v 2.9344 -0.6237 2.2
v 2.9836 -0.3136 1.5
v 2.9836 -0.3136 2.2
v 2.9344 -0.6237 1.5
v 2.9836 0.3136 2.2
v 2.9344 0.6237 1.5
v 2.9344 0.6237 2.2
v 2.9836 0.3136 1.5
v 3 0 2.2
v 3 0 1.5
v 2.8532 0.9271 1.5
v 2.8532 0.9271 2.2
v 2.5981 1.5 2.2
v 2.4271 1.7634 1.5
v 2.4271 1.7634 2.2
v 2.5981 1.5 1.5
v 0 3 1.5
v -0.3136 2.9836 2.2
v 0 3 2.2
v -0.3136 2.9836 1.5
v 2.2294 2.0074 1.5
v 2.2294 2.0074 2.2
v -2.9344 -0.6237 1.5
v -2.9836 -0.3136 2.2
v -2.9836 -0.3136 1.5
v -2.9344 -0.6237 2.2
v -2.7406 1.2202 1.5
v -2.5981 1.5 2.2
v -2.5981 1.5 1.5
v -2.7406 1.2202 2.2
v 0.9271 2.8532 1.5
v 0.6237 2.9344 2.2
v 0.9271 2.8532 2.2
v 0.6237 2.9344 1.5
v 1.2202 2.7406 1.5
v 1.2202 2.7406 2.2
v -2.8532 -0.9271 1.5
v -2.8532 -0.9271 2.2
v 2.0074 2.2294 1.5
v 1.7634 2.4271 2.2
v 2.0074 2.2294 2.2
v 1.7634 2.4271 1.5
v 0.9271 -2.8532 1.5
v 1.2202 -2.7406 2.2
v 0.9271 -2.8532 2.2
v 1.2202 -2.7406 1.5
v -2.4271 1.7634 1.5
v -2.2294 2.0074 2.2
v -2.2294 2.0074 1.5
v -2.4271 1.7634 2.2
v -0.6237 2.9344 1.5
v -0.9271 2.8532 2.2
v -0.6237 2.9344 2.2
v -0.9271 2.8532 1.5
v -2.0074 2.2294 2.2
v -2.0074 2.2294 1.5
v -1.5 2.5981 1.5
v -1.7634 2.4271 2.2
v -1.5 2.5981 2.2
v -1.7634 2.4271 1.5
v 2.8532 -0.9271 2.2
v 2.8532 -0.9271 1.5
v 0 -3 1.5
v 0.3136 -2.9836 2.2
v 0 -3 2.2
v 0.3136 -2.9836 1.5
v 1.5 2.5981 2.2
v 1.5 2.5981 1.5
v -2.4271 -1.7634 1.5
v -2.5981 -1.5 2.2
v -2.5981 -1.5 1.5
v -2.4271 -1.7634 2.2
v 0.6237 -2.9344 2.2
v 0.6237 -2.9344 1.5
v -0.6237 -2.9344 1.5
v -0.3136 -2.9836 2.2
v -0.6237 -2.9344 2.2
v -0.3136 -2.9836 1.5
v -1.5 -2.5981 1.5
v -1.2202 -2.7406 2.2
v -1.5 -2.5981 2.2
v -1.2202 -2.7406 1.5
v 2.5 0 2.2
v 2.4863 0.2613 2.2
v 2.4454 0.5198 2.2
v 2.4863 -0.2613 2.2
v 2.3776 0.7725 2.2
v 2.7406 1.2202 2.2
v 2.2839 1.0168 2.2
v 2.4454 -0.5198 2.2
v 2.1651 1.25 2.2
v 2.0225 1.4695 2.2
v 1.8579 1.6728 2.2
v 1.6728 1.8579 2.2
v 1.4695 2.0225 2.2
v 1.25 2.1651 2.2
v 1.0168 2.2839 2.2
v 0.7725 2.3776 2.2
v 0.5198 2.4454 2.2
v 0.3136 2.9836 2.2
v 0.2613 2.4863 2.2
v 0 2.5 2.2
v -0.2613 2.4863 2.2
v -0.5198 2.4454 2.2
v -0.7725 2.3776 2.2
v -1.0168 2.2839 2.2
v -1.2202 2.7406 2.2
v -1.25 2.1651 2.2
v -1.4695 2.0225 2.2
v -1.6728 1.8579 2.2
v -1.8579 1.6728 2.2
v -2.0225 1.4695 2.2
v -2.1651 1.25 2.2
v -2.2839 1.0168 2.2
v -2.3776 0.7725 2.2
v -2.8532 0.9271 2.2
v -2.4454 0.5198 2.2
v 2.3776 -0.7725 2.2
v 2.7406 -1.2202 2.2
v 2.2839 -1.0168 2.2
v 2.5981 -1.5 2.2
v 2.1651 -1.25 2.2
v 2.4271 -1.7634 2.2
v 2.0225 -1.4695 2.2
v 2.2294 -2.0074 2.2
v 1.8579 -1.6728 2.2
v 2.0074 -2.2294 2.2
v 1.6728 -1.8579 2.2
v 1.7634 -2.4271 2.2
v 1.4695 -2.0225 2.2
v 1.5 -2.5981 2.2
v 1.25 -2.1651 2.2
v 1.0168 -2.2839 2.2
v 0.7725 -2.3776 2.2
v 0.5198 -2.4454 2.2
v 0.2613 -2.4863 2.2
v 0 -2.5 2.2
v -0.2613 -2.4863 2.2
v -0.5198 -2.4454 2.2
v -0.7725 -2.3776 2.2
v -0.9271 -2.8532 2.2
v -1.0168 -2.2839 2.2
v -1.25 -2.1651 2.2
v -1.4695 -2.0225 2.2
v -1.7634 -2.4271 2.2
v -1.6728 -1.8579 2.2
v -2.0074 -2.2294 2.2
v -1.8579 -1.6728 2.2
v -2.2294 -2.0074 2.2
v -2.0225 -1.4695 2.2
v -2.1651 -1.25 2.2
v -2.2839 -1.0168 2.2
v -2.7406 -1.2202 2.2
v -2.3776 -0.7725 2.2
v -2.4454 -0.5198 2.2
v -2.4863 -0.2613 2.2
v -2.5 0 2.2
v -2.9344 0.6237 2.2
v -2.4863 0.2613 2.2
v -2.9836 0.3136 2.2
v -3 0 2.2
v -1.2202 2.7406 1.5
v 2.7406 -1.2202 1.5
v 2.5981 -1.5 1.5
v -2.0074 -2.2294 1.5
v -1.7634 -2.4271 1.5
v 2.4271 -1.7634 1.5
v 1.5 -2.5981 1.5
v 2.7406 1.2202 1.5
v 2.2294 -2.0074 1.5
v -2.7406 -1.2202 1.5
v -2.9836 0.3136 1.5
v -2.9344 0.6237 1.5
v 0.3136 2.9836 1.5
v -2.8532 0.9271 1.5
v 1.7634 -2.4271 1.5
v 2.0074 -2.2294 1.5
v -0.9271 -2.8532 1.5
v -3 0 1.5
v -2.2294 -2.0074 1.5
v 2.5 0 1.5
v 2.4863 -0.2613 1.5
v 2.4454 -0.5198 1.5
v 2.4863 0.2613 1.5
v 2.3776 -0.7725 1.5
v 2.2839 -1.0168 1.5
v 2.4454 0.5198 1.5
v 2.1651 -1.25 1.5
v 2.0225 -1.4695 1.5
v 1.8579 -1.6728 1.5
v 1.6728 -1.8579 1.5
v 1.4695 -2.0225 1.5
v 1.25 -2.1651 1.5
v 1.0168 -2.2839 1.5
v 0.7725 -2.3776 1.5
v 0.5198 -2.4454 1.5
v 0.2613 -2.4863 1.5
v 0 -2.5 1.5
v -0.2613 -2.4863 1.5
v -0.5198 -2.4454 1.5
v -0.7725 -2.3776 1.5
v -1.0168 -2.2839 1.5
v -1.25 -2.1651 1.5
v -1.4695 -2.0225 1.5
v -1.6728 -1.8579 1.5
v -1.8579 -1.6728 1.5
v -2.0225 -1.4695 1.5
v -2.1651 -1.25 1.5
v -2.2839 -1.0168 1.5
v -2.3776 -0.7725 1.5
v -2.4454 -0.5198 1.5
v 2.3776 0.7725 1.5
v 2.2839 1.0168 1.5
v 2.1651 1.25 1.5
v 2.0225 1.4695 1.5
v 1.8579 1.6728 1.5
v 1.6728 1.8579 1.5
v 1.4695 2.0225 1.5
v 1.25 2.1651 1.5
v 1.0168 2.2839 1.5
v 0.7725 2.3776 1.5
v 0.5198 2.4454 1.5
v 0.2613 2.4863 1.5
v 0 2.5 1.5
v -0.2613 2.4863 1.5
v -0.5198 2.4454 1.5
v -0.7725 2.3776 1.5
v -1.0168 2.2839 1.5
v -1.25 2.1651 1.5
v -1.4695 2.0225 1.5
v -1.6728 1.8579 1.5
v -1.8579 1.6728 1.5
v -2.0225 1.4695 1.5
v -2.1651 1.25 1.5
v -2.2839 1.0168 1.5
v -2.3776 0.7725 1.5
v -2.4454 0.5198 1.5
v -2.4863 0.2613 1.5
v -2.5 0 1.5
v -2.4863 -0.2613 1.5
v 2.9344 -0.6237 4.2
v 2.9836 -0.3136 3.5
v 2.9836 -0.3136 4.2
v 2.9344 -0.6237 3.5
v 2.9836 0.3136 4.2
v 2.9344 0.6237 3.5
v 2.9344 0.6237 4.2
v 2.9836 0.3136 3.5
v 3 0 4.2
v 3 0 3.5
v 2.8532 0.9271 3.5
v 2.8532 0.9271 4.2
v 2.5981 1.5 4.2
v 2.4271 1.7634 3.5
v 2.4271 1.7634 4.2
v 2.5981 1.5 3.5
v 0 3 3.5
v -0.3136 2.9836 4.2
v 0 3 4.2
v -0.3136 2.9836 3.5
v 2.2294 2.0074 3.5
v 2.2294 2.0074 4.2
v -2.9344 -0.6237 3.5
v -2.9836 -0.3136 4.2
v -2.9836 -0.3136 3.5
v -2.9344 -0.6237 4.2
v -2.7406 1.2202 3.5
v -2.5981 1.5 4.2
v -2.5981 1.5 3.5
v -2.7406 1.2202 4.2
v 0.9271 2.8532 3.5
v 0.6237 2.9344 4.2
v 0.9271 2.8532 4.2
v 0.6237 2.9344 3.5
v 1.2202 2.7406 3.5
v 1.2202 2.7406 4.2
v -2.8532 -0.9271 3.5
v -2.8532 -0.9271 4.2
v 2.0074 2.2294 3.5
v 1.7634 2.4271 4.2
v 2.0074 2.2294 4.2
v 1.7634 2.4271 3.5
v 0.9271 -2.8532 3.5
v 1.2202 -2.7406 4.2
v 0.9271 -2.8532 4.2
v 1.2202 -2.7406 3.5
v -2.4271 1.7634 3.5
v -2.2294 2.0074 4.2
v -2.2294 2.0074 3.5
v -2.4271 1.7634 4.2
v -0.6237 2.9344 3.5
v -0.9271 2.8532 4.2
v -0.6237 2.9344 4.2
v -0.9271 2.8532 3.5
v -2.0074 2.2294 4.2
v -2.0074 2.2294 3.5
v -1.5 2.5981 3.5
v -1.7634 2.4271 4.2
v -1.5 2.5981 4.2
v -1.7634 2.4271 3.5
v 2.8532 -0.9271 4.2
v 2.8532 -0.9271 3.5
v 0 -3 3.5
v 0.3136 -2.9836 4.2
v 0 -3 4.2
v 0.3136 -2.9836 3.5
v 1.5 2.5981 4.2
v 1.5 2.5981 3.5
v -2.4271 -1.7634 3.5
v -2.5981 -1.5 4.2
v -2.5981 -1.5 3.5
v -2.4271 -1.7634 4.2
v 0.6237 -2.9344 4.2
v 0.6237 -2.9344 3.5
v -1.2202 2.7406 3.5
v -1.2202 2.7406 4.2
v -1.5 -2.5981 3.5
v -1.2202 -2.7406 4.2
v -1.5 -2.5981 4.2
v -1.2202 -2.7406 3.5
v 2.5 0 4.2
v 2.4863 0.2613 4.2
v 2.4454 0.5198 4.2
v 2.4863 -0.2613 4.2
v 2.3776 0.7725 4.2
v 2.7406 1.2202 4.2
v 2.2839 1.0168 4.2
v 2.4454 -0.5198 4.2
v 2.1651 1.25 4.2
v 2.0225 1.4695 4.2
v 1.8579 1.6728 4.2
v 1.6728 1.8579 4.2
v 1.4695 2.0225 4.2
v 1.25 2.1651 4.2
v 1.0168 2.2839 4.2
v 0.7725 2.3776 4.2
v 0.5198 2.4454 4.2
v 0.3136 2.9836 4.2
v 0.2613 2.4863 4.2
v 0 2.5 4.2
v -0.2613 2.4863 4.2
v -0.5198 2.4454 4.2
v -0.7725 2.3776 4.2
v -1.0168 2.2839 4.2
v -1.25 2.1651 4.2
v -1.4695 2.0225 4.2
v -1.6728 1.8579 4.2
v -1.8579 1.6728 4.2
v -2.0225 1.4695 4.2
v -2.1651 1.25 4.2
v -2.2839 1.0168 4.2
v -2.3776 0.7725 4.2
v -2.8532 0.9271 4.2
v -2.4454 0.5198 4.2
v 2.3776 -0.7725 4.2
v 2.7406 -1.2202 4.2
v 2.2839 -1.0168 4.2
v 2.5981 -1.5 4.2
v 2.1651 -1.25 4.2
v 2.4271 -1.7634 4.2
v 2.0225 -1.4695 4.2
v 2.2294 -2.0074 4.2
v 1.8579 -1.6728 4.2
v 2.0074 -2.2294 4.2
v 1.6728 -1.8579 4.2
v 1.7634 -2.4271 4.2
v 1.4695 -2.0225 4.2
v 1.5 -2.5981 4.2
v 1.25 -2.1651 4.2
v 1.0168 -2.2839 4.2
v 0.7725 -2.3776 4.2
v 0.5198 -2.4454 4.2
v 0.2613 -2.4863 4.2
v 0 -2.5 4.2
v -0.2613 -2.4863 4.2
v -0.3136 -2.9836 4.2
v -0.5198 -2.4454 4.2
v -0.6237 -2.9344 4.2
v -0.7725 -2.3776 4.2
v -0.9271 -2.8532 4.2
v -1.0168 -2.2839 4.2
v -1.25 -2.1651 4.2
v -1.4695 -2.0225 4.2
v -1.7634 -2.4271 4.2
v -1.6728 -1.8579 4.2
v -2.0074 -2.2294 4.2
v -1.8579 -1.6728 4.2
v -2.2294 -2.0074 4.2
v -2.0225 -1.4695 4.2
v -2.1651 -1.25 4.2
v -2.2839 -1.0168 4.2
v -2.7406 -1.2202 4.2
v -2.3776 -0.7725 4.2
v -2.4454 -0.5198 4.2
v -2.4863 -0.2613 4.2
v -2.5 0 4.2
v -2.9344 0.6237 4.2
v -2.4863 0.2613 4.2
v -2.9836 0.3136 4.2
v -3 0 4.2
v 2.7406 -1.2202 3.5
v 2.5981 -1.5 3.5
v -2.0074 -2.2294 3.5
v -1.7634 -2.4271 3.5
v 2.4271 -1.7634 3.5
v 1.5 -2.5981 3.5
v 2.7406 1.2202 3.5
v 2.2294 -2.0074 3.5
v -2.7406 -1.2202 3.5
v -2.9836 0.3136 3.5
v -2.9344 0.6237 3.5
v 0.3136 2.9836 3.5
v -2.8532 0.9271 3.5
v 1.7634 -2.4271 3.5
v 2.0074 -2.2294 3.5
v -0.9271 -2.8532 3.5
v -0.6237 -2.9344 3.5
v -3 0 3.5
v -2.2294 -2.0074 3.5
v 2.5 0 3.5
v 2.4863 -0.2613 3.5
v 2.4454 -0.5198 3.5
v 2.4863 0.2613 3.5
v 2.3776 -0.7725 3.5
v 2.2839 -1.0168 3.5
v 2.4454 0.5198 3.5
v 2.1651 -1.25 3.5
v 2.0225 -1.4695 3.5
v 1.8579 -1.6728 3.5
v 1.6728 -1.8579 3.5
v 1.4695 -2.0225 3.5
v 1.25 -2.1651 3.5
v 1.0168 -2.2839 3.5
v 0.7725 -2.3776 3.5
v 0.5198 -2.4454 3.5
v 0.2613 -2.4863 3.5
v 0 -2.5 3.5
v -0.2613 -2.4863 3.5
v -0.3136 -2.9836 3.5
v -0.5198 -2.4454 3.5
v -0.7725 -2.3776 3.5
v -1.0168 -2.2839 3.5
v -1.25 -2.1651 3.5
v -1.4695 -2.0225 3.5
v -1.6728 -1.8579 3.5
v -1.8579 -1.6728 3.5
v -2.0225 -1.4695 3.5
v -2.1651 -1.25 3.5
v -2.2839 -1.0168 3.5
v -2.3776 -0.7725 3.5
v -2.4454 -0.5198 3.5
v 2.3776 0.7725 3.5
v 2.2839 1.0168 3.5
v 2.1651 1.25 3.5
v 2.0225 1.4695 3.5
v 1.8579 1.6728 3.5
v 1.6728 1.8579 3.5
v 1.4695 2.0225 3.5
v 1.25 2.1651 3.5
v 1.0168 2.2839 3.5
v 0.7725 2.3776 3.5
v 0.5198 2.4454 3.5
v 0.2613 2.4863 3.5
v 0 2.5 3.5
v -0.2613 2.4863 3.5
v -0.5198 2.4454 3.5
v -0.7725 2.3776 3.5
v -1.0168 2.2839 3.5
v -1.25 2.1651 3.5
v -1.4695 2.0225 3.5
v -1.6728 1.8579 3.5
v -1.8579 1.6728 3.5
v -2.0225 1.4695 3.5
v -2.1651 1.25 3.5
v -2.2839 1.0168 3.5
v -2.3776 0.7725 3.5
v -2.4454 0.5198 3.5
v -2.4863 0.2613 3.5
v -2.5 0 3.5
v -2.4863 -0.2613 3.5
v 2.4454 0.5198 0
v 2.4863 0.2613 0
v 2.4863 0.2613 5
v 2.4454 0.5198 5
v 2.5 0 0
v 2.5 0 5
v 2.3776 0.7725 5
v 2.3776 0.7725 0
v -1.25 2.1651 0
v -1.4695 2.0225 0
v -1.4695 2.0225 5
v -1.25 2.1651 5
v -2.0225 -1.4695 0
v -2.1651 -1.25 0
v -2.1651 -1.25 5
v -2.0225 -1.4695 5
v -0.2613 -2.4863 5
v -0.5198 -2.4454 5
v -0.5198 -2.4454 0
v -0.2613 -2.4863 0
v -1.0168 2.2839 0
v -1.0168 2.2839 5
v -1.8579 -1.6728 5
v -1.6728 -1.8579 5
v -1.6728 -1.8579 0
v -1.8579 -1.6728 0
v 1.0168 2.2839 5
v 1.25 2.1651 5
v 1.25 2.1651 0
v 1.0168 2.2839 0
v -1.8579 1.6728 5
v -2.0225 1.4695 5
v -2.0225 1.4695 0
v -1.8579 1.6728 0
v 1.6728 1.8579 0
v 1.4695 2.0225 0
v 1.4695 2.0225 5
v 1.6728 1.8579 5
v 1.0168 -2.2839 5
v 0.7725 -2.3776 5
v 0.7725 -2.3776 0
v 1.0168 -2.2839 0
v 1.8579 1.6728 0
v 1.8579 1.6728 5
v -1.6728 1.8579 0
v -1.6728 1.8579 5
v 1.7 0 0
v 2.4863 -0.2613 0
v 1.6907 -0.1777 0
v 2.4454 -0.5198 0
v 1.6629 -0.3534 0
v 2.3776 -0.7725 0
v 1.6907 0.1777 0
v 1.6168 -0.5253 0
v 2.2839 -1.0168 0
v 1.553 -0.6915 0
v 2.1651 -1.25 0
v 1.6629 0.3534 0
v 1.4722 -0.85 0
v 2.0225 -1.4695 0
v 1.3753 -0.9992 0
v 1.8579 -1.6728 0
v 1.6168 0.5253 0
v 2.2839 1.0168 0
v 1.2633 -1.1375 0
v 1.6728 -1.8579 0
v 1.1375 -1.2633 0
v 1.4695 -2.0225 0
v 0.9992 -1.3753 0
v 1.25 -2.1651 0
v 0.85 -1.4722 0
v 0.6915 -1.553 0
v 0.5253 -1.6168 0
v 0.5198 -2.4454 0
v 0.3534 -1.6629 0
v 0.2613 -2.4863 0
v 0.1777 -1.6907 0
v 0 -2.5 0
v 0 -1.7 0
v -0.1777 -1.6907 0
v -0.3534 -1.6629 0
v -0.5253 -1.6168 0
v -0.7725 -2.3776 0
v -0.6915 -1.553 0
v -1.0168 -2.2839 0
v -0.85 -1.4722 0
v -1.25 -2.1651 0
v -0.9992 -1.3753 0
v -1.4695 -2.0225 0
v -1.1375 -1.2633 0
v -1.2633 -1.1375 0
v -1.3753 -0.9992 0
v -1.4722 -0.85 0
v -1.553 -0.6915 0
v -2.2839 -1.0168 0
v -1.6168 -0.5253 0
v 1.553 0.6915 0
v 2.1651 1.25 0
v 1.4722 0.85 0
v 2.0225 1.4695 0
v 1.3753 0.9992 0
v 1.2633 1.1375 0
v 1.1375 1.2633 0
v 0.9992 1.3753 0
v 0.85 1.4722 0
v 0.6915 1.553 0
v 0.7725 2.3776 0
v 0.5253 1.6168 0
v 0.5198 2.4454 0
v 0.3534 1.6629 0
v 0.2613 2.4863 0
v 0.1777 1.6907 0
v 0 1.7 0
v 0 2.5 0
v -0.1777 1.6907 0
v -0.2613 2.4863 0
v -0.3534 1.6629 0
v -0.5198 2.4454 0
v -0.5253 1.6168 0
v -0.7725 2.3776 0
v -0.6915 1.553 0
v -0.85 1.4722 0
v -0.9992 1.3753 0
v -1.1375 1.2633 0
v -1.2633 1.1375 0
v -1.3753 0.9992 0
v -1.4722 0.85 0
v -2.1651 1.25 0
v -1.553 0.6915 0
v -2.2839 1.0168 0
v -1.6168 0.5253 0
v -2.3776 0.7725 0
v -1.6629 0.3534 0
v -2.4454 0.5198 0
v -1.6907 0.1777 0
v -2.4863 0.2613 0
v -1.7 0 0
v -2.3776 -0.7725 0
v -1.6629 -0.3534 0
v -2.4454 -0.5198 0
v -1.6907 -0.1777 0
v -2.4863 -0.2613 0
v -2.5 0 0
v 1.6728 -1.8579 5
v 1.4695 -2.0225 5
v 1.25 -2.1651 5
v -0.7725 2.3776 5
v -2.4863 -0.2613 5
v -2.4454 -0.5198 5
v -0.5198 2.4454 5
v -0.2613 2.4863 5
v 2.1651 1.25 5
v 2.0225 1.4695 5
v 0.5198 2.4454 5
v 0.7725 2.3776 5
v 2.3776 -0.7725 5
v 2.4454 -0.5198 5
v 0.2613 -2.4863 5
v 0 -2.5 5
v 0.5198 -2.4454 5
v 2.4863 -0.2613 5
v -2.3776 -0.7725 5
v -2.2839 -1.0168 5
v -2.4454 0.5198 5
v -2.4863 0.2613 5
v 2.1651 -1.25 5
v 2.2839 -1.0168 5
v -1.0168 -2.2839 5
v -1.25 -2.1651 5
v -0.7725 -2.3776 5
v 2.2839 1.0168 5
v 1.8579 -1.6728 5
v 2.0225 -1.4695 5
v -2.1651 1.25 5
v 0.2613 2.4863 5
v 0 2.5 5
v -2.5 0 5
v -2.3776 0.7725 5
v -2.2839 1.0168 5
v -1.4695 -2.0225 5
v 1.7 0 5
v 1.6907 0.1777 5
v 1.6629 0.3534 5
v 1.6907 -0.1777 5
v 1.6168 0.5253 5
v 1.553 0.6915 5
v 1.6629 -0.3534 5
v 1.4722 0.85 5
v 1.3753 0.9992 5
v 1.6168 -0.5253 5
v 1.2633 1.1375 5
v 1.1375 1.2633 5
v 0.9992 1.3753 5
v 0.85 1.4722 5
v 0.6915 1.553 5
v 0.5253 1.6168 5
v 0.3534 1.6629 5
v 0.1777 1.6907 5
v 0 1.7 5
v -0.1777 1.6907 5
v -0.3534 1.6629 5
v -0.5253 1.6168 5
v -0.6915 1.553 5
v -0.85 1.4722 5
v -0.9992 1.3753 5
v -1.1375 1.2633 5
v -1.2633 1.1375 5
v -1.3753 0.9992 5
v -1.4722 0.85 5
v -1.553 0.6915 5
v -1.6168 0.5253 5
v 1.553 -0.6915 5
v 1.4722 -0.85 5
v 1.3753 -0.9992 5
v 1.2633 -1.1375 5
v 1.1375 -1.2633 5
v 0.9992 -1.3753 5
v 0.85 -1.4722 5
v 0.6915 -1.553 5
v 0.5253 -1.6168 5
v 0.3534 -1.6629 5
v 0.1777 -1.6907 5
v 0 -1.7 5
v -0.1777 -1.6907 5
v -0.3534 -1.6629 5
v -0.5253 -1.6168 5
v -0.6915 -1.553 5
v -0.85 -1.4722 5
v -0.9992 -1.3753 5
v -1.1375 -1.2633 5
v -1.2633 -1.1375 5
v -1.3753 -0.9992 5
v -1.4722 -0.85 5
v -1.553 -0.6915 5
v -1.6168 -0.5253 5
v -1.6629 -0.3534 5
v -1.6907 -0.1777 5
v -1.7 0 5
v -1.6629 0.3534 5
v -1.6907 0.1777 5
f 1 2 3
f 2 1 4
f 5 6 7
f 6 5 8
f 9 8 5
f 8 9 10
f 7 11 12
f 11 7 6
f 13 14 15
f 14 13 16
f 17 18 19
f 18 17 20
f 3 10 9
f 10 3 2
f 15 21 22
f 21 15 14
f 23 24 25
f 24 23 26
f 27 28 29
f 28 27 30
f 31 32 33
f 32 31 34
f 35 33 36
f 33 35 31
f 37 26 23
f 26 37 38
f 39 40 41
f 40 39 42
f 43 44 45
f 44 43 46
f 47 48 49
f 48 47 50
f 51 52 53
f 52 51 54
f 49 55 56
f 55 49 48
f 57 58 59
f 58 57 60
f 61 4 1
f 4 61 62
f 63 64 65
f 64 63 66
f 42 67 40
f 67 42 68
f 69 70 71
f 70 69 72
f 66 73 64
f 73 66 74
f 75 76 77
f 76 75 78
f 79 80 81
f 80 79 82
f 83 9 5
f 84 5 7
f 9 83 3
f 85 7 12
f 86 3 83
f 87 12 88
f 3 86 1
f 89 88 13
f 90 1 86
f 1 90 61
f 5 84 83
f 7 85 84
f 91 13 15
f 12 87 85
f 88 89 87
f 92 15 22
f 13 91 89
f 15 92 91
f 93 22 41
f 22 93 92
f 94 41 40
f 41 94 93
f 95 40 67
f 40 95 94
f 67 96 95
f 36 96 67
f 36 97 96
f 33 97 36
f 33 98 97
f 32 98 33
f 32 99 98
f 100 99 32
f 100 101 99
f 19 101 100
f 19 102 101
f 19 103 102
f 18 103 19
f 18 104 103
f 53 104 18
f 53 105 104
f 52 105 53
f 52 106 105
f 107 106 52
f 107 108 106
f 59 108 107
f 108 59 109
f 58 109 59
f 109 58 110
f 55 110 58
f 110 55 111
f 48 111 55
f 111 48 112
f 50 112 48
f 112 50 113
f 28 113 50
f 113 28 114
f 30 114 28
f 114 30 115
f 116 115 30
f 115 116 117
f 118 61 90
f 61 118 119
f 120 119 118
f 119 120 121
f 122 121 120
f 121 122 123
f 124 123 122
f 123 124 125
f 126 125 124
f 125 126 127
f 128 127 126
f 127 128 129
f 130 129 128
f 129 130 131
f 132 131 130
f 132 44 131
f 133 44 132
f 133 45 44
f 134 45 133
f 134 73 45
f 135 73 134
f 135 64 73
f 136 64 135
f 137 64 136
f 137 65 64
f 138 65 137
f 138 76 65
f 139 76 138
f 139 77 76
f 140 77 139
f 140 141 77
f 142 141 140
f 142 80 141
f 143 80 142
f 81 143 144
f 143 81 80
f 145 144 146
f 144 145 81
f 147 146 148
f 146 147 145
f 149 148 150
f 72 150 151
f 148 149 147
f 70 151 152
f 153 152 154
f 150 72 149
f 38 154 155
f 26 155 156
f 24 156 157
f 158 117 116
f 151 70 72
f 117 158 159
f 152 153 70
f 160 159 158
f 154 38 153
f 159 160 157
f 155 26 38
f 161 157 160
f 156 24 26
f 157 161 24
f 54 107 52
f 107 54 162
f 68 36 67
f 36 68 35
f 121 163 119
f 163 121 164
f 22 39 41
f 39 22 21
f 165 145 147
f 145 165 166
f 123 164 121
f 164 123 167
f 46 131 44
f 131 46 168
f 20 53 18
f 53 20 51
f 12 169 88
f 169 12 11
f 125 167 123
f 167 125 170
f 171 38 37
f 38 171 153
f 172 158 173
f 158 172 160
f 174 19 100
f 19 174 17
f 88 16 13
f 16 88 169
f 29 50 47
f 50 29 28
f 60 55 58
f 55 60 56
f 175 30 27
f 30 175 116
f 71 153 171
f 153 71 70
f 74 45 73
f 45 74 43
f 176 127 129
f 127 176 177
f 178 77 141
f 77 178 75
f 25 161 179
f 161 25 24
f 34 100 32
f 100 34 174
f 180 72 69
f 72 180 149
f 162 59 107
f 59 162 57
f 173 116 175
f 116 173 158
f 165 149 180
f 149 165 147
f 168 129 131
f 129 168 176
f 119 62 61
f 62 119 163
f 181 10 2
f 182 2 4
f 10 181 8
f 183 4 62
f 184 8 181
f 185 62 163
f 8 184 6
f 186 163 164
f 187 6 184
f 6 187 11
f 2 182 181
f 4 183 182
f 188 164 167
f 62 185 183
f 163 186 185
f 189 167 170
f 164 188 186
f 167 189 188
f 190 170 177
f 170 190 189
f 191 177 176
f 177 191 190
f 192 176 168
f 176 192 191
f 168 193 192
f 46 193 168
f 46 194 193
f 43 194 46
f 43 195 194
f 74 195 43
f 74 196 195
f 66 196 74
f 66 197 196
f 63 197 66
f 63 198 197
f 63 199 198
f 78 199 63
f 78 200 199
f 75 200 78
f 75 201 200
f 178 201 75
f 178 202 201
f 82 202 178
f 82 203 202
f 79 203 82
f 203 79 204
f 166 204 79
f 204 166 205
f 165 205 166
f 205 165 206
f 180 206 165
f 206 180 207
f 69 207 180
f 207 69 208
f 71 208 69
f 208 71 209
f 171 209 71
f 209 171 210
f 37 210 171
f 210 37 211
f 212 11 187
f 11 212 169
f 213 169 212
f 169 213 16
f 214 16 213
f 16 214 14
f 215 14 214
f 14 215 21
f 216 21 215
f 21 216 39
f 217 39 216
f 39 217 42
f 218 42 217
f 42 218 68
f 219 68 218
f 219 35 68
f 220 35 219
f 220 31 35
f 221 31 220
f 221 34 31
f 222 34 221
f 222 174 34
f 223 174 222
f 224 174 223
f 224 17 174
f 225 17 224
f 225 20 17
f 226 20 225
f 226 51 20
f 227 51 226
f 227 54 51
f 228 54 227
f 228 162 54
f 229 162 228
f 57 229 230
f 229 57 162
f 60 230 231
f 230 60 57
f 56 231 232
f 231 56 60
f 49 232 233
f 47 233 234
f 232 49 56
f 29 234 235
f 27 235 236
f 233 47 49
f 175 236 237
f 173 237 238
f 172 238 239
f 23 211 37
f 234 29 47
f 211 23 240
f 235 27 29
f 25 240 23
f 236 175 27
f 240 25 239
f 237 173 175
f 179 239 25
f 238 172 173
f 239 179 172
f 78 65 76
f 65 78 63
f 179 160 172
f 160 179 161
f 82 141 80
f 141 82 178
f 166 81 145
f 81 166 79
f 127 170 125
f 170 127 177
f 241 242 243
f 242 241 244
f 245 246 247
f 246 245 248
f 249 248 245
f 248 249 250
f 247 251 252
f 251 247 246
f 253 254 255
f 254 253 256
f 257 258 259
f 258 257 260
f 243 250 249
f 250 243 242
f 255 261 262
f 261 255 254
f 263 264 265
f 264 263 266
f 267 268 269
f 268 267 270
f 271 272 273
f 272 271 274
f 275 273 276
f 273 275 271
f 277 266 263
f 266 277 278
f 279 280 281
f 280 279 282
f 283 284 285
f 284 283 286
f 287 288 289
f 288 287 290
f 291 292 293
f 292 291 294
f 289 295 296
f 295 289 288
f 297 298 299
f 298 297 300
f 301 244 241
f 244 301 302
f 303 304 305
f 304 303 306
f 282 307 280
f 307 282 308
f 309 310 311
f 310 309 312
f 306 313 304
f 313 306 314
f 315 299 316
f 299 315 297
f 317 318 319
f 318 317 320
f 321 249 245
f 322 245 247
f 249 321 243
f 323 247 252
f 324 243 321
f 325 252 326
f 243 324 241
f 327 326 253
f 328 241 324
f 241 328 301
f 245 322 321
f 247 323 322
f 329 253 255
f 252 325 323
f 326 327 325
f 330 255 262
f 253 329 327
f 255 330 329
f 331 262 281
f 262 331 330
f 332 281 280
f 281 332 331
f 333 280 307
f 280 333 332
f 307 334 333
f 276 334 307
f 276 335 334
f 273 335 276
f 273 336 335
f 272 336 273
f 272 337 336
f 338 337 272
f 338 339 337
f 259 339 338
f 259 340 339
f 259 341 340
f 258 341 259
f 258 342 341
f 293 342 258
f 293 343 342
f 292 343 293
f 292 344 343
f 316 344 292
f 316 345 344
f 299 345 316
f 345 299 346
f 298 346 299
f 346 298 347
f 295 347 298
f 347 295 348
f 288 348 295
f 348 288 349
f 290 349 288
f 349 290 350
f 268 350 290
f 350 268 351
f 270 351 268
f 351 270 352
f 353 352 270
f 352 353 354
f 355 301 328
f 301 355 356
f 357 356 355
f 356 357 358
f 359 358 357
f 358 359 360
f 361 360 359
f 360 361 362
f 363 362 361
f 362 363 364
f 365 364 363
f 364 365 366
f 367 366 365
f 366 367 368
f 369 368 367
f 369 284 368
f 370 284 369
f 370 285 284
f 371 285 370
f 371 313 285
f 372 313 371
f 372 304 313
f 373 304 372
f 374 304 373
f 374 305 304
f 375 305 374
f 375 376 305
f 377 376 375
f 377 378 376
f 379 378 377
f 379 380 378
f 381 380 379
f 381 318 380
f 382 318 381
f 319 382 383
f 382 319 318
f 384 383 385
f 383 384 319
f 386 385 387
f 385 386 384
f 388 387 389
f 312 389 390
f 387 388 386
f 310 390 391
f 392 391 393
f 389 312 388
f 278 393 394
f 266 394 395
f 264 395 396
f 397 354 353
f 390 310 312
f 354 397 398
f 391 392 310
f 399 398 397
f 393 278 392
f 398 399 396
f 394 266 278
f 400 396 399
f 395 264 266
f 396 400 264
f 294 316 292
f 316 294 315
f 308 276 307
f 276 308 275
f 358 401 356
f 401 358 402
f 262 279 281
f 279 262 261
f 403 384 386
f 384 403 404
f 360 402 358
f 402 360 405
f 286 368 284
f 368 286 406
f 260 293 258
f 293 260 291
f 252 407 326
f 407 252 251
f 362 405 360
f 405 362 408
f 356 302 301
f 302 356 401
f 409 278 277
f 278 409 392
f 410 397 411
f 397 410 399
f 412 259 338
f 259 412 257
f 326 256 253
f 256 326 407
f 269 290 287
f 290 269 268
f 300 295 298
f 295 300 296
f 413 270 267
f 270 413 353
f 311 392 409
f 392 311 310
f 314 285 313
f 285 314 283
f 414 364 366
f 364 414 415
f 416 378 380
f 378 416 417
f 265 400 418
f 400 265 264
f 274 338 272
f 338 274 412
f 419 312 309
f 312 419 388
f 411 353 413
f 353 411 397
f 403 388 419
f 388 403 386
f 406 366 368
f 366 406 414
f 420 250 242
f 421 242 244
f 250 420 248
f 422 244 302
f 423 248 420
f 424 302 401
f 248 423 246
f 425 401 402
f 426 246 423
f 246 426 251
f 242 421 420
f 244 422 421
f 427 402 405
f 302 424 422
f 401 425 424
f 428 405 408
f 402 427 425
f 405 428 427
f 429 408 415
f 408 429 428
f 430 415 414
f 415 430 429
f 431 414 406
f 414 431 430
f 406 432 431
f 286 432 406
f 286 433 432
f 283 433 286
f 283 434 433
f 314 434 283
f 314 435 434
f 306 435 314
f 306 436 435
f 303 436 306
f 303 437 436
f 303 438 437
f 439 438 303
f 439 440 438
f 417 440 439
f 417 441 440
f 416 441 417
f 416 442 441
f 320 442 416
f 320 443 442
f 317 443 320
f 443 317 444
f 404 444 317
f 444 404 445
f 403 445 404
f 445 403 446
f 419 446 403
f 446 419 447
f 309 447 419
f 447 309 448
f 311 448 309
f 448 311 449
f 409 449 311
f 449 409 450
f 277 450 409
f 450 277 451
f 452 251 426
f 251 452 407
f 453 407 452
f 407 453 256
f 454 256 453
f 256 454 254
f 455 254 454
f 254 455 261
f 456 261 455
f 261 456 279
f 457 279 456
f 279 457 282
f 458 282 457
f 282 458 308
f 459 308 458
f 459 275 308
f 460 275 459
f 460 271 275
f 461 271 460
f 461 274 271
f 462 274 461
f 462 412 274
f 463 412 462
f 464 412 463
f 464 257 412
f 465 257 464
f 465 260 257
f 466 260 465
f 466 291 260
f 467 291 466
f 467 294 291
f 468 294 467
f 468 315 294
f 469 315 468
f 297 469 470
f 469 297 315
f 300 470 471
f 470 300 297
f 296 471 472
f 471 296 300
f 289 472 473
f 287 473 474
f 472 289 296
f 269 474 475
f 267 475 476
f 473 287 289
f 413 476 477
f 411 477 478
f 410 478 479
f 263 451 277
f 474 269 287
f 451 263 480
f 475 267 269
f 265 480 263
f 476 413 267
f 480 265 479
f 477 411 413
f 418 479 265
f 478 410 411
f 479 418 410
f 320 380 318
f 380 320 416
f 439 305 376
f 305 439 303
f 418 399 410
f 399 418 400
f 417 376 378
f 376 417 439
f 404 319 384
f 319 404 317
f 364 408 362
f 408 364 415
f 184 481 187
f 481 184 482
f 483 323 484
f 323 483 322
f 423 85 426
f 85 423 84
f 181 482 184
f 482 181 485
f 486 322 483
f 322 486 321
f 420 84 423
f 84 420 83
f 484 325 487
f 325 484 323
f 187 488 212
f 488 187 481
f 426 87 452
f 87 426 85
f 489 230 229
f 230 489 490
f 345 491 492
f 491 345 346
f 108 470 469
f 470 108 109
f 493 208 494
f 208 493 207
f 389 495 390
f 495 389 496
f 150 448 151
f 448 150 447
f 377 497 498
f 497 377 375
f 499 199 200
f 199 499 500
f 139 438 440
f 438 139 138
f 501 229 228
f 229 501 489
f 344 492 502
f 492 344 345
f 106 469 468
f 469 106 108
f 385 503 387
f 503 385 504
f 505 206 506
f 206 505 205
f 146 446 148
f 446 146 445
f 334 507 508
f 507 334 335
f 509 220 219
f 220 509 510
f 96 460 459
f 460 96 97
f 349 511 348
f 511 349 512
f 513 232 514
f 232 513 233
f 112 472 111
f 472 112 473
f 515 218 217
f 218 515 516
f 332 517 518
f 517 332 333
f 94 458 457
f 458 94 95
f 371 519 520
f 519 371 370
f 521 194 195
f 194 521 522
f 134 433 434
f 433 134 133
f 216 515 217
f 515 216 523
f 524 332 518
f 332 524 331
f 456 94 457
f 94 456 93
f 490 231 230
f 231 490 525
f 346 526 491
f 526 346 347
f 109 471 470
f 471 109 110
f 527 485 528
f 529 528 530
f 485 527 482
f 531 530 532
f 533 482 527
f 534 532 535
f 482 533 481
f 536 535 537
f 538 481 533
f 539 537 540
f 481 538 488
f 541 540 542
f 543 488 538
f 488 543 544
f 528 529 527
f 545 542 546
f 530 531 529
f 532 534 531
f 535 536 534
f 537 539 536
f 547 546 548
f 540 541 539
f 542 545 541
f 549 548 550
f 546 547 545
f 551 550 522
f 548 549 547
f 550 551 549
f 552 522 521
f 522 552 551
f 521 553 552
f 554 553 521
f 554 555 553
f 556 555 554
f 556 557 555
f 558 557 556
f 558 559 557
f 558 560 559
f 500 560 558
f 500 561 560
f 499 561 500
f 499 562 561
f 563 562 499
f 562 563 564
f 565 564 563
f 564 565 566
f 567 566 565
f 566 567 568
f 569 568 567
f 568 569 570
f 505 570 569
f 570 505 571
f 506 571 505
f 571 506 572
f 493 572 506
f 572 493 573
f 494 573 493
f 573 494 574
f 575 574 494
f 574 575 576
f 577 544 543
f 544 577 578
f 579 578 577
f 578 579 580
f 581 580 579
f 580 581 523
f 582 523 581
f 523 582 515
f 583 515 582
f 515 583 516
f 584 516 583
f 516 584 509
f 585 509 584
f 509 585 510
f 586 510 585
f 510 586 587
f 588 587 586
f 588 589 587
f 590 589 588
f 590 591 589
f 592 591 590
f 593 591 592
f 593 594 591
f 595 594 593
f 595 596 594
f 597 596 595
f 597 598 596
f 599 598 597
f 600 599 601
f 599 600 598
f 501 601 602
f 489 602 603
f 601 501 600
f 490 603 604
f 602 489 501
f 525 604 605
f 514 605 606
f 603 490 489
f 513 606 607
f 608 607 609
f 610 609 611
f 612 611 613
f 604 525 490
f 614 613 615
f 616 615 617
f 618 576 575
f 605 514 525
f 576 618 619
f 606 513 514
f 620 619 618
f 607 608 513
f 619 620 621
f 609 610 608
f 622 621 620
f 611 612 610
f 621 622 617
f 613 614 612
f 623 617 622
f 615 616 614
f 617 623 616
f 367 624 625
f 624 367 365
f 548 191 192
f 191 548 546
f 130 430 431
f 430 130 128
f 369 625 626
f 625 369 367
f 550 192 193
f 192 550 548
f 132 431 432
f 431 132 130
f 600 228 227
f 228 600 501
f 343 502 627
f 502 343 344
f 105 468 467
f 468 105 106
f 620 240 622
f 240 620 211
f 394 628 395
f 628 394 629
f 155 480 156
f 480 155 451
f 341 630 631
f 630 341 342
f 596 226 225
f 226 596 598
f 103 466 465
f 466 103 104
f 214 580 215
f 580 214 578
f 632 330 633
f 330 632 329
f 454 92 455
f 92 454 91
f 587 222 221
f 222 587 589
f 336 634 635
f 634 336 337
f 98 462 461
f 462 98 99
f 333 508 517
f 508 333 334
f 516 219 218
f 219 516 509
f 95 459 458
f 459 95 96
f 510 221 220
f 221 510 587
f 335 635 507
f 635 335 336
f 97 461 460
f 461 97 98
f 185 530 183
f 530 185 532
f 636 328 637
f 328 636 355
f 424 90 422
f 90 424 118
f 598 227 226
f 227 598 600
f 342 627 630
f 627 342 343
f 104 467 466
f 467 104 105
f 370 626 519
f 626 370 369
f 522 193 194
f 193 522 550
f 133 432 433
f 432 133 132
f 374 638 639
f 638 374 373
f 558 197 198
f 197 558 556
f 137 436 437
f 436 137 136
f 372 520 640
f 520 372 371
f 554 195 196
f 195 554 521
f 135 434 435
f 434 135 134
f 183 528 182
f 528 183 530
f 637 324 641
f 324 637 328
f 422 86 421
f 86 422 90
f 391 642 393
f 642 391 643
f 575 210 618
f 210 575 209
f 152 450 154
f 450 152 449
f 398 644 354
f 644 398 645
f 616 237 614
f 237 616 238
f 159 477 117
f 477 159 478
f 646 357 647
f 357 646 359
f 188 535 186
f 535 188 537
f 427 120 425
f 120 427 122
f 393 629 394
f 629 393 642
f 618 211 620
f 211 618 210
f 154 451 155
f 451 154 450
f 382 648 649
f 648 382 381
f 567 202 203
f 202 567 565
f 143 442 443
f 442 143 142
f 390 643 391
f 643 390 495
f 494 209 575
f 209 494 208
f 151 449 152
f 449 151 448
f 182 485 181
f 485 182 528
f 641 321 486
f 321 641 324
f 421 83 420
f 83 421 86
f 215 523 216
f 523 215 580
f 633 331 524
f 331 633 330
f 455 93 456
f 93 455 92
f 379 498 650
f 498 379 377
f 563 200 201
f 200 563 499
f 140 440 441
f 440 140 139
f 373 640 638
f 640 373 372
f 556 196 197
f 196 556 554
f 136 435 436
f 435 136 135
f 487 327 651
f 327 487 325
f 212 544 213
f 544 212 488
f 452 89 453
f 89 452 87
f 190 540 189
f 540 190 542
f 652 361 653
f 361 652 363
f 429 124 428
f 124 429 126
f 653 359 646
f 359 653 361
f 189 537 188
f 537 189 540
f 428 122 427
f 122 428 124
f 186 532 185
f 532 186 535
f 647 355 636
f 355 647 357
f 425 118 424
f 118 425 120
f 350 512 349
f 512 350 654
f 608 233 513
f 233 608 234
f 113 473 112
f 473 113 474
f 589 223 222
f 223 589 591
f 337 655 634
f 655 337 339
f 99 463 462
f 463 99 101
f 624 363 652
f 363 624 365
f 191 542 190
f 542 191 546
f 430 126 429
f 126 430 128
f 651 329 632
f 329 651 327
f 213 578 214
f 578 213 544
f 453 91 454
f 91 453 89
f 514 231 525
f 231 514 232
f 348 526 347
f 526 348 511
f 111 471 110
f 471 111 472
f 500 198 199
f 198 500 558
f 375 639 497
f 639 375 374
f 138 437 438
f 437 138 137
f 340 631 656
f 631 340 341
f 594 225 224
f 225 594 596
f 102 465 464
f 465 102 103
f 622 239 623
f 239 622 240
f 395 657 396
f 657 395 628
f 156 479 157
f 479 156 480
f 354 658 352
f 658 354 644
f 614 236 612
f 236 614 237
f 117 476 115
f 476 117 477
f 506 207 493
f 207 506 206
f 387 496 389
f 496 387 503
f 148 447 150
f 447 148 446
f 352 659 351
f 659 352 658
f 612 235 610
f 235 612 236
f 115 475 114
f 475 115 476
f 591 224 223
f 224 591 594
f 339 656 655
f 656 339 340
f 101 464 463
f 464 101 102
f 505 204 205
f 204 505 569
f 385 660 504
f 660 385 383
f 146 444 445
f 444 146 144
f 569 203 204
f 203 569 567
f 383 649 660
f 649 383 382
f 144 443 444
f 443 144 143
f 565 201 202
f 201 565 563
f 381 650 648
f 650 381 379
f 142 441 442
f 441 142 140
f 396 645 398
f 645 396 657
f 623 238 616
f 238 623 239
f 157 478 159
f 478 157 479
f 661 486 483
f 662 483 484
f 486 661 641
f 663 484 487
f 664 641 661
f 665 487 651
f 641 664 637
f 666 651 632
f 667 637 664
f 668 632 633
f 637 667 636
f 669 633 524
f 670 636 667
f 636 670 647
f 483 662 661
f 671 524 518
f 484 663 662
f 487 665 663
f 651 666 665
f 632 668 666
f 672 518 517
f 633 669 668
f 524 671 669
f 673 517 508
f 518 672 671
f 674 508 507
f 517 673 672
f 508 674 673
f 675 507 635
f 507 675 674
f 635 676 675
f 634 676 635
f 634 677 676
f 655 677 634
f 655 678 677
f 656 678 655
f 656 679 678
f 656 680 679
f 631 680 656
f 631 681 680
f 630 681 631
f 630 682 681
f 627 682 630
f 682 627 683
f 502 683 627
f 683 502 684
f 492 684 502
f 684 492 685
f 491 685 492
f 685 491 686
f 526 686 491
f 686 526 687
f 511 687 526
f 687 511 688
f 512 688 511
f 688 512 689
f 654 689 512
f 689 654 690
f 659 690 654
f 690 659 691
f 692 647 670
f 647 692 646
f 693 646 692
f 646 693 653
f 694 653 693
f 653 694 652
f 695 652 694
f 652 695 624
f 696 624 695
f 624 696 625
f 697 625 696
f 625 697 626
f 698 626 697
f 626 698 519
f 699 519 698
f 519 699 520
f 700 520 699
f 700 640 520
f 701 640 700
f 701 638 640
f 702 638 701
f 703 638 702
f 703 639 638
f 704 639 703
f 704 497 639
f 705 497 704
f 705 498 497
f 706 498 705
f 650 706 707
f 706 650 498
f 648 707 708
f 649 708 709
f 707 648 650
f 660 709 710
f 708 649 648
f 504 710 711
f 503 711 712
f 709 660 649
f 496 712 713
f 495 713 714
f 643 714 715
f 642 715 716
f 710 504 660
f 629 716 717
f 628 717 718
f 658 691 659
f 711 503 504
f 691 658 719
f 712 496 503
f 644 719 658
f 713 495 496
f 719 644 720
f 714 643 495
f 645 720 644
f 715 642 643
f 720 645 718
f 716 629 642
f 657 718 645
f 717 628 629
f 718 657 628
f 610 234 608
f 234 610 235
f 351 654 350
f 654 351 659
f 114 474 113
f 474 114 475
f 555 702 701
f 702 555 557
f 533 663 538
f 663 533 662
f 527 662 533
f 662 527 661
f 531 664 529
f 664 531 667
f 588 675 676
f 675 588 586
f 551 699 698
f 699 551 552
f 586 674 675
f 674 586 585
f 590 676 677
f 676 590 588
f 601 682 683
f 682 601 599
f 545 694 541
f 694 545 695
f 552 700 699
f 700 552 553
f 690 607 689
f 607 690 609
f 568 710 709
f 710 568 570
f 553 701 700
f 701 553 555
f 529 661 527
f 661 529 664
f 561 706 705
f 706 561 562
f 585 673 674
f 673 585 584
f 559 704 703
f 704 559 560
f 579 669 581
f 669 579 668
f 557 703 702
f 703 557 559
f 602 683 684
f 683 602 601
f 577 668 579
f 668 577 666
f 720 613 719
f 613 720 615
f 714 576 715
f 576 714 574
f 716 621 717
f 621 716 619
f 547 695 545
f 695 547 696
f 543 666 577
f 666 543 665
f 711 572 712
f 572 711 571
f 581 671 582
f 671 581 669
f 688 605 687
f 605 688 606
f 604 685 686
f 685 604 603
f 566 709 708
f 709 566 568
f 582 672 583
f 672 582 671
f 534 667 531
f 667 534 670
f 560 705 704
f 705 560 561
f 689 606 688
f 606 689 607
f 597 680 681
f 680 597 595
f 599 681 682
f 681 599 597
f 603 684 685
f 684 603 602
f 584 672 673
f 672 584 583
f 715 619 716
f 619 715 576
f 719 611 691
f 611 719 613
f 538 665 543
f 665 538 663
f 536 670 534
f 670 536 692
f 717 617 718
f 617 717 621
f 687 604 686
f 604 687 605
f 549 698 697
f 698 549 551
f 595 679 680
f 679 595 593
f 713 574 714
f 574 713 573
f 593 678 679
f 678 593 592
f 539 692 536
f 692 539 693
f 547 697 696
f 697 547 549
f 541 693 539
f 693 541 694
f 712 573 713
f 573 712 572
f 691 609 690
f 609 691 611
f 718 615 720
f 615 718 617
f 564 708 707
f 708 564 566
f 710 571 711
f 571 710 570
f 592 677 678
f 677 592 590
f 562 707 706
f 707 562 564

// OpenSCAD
// Heat-set insert, simplified ribbed geometry.
$fn = 60;
eps = 0.02;
inner_d = 3.4;
outer_d = 5;
length = 5;
difference() {
    union() {
        cylinder(d=outer_d,h=length);
        for(z=[1.5:2:length-1]) translate([0,0,z]) cylinder(d=outer_d+1,h=0.7);
    }
    translate([0,0,-eps]) cylinder(d=inner_d,h=length+2*eps);
}
